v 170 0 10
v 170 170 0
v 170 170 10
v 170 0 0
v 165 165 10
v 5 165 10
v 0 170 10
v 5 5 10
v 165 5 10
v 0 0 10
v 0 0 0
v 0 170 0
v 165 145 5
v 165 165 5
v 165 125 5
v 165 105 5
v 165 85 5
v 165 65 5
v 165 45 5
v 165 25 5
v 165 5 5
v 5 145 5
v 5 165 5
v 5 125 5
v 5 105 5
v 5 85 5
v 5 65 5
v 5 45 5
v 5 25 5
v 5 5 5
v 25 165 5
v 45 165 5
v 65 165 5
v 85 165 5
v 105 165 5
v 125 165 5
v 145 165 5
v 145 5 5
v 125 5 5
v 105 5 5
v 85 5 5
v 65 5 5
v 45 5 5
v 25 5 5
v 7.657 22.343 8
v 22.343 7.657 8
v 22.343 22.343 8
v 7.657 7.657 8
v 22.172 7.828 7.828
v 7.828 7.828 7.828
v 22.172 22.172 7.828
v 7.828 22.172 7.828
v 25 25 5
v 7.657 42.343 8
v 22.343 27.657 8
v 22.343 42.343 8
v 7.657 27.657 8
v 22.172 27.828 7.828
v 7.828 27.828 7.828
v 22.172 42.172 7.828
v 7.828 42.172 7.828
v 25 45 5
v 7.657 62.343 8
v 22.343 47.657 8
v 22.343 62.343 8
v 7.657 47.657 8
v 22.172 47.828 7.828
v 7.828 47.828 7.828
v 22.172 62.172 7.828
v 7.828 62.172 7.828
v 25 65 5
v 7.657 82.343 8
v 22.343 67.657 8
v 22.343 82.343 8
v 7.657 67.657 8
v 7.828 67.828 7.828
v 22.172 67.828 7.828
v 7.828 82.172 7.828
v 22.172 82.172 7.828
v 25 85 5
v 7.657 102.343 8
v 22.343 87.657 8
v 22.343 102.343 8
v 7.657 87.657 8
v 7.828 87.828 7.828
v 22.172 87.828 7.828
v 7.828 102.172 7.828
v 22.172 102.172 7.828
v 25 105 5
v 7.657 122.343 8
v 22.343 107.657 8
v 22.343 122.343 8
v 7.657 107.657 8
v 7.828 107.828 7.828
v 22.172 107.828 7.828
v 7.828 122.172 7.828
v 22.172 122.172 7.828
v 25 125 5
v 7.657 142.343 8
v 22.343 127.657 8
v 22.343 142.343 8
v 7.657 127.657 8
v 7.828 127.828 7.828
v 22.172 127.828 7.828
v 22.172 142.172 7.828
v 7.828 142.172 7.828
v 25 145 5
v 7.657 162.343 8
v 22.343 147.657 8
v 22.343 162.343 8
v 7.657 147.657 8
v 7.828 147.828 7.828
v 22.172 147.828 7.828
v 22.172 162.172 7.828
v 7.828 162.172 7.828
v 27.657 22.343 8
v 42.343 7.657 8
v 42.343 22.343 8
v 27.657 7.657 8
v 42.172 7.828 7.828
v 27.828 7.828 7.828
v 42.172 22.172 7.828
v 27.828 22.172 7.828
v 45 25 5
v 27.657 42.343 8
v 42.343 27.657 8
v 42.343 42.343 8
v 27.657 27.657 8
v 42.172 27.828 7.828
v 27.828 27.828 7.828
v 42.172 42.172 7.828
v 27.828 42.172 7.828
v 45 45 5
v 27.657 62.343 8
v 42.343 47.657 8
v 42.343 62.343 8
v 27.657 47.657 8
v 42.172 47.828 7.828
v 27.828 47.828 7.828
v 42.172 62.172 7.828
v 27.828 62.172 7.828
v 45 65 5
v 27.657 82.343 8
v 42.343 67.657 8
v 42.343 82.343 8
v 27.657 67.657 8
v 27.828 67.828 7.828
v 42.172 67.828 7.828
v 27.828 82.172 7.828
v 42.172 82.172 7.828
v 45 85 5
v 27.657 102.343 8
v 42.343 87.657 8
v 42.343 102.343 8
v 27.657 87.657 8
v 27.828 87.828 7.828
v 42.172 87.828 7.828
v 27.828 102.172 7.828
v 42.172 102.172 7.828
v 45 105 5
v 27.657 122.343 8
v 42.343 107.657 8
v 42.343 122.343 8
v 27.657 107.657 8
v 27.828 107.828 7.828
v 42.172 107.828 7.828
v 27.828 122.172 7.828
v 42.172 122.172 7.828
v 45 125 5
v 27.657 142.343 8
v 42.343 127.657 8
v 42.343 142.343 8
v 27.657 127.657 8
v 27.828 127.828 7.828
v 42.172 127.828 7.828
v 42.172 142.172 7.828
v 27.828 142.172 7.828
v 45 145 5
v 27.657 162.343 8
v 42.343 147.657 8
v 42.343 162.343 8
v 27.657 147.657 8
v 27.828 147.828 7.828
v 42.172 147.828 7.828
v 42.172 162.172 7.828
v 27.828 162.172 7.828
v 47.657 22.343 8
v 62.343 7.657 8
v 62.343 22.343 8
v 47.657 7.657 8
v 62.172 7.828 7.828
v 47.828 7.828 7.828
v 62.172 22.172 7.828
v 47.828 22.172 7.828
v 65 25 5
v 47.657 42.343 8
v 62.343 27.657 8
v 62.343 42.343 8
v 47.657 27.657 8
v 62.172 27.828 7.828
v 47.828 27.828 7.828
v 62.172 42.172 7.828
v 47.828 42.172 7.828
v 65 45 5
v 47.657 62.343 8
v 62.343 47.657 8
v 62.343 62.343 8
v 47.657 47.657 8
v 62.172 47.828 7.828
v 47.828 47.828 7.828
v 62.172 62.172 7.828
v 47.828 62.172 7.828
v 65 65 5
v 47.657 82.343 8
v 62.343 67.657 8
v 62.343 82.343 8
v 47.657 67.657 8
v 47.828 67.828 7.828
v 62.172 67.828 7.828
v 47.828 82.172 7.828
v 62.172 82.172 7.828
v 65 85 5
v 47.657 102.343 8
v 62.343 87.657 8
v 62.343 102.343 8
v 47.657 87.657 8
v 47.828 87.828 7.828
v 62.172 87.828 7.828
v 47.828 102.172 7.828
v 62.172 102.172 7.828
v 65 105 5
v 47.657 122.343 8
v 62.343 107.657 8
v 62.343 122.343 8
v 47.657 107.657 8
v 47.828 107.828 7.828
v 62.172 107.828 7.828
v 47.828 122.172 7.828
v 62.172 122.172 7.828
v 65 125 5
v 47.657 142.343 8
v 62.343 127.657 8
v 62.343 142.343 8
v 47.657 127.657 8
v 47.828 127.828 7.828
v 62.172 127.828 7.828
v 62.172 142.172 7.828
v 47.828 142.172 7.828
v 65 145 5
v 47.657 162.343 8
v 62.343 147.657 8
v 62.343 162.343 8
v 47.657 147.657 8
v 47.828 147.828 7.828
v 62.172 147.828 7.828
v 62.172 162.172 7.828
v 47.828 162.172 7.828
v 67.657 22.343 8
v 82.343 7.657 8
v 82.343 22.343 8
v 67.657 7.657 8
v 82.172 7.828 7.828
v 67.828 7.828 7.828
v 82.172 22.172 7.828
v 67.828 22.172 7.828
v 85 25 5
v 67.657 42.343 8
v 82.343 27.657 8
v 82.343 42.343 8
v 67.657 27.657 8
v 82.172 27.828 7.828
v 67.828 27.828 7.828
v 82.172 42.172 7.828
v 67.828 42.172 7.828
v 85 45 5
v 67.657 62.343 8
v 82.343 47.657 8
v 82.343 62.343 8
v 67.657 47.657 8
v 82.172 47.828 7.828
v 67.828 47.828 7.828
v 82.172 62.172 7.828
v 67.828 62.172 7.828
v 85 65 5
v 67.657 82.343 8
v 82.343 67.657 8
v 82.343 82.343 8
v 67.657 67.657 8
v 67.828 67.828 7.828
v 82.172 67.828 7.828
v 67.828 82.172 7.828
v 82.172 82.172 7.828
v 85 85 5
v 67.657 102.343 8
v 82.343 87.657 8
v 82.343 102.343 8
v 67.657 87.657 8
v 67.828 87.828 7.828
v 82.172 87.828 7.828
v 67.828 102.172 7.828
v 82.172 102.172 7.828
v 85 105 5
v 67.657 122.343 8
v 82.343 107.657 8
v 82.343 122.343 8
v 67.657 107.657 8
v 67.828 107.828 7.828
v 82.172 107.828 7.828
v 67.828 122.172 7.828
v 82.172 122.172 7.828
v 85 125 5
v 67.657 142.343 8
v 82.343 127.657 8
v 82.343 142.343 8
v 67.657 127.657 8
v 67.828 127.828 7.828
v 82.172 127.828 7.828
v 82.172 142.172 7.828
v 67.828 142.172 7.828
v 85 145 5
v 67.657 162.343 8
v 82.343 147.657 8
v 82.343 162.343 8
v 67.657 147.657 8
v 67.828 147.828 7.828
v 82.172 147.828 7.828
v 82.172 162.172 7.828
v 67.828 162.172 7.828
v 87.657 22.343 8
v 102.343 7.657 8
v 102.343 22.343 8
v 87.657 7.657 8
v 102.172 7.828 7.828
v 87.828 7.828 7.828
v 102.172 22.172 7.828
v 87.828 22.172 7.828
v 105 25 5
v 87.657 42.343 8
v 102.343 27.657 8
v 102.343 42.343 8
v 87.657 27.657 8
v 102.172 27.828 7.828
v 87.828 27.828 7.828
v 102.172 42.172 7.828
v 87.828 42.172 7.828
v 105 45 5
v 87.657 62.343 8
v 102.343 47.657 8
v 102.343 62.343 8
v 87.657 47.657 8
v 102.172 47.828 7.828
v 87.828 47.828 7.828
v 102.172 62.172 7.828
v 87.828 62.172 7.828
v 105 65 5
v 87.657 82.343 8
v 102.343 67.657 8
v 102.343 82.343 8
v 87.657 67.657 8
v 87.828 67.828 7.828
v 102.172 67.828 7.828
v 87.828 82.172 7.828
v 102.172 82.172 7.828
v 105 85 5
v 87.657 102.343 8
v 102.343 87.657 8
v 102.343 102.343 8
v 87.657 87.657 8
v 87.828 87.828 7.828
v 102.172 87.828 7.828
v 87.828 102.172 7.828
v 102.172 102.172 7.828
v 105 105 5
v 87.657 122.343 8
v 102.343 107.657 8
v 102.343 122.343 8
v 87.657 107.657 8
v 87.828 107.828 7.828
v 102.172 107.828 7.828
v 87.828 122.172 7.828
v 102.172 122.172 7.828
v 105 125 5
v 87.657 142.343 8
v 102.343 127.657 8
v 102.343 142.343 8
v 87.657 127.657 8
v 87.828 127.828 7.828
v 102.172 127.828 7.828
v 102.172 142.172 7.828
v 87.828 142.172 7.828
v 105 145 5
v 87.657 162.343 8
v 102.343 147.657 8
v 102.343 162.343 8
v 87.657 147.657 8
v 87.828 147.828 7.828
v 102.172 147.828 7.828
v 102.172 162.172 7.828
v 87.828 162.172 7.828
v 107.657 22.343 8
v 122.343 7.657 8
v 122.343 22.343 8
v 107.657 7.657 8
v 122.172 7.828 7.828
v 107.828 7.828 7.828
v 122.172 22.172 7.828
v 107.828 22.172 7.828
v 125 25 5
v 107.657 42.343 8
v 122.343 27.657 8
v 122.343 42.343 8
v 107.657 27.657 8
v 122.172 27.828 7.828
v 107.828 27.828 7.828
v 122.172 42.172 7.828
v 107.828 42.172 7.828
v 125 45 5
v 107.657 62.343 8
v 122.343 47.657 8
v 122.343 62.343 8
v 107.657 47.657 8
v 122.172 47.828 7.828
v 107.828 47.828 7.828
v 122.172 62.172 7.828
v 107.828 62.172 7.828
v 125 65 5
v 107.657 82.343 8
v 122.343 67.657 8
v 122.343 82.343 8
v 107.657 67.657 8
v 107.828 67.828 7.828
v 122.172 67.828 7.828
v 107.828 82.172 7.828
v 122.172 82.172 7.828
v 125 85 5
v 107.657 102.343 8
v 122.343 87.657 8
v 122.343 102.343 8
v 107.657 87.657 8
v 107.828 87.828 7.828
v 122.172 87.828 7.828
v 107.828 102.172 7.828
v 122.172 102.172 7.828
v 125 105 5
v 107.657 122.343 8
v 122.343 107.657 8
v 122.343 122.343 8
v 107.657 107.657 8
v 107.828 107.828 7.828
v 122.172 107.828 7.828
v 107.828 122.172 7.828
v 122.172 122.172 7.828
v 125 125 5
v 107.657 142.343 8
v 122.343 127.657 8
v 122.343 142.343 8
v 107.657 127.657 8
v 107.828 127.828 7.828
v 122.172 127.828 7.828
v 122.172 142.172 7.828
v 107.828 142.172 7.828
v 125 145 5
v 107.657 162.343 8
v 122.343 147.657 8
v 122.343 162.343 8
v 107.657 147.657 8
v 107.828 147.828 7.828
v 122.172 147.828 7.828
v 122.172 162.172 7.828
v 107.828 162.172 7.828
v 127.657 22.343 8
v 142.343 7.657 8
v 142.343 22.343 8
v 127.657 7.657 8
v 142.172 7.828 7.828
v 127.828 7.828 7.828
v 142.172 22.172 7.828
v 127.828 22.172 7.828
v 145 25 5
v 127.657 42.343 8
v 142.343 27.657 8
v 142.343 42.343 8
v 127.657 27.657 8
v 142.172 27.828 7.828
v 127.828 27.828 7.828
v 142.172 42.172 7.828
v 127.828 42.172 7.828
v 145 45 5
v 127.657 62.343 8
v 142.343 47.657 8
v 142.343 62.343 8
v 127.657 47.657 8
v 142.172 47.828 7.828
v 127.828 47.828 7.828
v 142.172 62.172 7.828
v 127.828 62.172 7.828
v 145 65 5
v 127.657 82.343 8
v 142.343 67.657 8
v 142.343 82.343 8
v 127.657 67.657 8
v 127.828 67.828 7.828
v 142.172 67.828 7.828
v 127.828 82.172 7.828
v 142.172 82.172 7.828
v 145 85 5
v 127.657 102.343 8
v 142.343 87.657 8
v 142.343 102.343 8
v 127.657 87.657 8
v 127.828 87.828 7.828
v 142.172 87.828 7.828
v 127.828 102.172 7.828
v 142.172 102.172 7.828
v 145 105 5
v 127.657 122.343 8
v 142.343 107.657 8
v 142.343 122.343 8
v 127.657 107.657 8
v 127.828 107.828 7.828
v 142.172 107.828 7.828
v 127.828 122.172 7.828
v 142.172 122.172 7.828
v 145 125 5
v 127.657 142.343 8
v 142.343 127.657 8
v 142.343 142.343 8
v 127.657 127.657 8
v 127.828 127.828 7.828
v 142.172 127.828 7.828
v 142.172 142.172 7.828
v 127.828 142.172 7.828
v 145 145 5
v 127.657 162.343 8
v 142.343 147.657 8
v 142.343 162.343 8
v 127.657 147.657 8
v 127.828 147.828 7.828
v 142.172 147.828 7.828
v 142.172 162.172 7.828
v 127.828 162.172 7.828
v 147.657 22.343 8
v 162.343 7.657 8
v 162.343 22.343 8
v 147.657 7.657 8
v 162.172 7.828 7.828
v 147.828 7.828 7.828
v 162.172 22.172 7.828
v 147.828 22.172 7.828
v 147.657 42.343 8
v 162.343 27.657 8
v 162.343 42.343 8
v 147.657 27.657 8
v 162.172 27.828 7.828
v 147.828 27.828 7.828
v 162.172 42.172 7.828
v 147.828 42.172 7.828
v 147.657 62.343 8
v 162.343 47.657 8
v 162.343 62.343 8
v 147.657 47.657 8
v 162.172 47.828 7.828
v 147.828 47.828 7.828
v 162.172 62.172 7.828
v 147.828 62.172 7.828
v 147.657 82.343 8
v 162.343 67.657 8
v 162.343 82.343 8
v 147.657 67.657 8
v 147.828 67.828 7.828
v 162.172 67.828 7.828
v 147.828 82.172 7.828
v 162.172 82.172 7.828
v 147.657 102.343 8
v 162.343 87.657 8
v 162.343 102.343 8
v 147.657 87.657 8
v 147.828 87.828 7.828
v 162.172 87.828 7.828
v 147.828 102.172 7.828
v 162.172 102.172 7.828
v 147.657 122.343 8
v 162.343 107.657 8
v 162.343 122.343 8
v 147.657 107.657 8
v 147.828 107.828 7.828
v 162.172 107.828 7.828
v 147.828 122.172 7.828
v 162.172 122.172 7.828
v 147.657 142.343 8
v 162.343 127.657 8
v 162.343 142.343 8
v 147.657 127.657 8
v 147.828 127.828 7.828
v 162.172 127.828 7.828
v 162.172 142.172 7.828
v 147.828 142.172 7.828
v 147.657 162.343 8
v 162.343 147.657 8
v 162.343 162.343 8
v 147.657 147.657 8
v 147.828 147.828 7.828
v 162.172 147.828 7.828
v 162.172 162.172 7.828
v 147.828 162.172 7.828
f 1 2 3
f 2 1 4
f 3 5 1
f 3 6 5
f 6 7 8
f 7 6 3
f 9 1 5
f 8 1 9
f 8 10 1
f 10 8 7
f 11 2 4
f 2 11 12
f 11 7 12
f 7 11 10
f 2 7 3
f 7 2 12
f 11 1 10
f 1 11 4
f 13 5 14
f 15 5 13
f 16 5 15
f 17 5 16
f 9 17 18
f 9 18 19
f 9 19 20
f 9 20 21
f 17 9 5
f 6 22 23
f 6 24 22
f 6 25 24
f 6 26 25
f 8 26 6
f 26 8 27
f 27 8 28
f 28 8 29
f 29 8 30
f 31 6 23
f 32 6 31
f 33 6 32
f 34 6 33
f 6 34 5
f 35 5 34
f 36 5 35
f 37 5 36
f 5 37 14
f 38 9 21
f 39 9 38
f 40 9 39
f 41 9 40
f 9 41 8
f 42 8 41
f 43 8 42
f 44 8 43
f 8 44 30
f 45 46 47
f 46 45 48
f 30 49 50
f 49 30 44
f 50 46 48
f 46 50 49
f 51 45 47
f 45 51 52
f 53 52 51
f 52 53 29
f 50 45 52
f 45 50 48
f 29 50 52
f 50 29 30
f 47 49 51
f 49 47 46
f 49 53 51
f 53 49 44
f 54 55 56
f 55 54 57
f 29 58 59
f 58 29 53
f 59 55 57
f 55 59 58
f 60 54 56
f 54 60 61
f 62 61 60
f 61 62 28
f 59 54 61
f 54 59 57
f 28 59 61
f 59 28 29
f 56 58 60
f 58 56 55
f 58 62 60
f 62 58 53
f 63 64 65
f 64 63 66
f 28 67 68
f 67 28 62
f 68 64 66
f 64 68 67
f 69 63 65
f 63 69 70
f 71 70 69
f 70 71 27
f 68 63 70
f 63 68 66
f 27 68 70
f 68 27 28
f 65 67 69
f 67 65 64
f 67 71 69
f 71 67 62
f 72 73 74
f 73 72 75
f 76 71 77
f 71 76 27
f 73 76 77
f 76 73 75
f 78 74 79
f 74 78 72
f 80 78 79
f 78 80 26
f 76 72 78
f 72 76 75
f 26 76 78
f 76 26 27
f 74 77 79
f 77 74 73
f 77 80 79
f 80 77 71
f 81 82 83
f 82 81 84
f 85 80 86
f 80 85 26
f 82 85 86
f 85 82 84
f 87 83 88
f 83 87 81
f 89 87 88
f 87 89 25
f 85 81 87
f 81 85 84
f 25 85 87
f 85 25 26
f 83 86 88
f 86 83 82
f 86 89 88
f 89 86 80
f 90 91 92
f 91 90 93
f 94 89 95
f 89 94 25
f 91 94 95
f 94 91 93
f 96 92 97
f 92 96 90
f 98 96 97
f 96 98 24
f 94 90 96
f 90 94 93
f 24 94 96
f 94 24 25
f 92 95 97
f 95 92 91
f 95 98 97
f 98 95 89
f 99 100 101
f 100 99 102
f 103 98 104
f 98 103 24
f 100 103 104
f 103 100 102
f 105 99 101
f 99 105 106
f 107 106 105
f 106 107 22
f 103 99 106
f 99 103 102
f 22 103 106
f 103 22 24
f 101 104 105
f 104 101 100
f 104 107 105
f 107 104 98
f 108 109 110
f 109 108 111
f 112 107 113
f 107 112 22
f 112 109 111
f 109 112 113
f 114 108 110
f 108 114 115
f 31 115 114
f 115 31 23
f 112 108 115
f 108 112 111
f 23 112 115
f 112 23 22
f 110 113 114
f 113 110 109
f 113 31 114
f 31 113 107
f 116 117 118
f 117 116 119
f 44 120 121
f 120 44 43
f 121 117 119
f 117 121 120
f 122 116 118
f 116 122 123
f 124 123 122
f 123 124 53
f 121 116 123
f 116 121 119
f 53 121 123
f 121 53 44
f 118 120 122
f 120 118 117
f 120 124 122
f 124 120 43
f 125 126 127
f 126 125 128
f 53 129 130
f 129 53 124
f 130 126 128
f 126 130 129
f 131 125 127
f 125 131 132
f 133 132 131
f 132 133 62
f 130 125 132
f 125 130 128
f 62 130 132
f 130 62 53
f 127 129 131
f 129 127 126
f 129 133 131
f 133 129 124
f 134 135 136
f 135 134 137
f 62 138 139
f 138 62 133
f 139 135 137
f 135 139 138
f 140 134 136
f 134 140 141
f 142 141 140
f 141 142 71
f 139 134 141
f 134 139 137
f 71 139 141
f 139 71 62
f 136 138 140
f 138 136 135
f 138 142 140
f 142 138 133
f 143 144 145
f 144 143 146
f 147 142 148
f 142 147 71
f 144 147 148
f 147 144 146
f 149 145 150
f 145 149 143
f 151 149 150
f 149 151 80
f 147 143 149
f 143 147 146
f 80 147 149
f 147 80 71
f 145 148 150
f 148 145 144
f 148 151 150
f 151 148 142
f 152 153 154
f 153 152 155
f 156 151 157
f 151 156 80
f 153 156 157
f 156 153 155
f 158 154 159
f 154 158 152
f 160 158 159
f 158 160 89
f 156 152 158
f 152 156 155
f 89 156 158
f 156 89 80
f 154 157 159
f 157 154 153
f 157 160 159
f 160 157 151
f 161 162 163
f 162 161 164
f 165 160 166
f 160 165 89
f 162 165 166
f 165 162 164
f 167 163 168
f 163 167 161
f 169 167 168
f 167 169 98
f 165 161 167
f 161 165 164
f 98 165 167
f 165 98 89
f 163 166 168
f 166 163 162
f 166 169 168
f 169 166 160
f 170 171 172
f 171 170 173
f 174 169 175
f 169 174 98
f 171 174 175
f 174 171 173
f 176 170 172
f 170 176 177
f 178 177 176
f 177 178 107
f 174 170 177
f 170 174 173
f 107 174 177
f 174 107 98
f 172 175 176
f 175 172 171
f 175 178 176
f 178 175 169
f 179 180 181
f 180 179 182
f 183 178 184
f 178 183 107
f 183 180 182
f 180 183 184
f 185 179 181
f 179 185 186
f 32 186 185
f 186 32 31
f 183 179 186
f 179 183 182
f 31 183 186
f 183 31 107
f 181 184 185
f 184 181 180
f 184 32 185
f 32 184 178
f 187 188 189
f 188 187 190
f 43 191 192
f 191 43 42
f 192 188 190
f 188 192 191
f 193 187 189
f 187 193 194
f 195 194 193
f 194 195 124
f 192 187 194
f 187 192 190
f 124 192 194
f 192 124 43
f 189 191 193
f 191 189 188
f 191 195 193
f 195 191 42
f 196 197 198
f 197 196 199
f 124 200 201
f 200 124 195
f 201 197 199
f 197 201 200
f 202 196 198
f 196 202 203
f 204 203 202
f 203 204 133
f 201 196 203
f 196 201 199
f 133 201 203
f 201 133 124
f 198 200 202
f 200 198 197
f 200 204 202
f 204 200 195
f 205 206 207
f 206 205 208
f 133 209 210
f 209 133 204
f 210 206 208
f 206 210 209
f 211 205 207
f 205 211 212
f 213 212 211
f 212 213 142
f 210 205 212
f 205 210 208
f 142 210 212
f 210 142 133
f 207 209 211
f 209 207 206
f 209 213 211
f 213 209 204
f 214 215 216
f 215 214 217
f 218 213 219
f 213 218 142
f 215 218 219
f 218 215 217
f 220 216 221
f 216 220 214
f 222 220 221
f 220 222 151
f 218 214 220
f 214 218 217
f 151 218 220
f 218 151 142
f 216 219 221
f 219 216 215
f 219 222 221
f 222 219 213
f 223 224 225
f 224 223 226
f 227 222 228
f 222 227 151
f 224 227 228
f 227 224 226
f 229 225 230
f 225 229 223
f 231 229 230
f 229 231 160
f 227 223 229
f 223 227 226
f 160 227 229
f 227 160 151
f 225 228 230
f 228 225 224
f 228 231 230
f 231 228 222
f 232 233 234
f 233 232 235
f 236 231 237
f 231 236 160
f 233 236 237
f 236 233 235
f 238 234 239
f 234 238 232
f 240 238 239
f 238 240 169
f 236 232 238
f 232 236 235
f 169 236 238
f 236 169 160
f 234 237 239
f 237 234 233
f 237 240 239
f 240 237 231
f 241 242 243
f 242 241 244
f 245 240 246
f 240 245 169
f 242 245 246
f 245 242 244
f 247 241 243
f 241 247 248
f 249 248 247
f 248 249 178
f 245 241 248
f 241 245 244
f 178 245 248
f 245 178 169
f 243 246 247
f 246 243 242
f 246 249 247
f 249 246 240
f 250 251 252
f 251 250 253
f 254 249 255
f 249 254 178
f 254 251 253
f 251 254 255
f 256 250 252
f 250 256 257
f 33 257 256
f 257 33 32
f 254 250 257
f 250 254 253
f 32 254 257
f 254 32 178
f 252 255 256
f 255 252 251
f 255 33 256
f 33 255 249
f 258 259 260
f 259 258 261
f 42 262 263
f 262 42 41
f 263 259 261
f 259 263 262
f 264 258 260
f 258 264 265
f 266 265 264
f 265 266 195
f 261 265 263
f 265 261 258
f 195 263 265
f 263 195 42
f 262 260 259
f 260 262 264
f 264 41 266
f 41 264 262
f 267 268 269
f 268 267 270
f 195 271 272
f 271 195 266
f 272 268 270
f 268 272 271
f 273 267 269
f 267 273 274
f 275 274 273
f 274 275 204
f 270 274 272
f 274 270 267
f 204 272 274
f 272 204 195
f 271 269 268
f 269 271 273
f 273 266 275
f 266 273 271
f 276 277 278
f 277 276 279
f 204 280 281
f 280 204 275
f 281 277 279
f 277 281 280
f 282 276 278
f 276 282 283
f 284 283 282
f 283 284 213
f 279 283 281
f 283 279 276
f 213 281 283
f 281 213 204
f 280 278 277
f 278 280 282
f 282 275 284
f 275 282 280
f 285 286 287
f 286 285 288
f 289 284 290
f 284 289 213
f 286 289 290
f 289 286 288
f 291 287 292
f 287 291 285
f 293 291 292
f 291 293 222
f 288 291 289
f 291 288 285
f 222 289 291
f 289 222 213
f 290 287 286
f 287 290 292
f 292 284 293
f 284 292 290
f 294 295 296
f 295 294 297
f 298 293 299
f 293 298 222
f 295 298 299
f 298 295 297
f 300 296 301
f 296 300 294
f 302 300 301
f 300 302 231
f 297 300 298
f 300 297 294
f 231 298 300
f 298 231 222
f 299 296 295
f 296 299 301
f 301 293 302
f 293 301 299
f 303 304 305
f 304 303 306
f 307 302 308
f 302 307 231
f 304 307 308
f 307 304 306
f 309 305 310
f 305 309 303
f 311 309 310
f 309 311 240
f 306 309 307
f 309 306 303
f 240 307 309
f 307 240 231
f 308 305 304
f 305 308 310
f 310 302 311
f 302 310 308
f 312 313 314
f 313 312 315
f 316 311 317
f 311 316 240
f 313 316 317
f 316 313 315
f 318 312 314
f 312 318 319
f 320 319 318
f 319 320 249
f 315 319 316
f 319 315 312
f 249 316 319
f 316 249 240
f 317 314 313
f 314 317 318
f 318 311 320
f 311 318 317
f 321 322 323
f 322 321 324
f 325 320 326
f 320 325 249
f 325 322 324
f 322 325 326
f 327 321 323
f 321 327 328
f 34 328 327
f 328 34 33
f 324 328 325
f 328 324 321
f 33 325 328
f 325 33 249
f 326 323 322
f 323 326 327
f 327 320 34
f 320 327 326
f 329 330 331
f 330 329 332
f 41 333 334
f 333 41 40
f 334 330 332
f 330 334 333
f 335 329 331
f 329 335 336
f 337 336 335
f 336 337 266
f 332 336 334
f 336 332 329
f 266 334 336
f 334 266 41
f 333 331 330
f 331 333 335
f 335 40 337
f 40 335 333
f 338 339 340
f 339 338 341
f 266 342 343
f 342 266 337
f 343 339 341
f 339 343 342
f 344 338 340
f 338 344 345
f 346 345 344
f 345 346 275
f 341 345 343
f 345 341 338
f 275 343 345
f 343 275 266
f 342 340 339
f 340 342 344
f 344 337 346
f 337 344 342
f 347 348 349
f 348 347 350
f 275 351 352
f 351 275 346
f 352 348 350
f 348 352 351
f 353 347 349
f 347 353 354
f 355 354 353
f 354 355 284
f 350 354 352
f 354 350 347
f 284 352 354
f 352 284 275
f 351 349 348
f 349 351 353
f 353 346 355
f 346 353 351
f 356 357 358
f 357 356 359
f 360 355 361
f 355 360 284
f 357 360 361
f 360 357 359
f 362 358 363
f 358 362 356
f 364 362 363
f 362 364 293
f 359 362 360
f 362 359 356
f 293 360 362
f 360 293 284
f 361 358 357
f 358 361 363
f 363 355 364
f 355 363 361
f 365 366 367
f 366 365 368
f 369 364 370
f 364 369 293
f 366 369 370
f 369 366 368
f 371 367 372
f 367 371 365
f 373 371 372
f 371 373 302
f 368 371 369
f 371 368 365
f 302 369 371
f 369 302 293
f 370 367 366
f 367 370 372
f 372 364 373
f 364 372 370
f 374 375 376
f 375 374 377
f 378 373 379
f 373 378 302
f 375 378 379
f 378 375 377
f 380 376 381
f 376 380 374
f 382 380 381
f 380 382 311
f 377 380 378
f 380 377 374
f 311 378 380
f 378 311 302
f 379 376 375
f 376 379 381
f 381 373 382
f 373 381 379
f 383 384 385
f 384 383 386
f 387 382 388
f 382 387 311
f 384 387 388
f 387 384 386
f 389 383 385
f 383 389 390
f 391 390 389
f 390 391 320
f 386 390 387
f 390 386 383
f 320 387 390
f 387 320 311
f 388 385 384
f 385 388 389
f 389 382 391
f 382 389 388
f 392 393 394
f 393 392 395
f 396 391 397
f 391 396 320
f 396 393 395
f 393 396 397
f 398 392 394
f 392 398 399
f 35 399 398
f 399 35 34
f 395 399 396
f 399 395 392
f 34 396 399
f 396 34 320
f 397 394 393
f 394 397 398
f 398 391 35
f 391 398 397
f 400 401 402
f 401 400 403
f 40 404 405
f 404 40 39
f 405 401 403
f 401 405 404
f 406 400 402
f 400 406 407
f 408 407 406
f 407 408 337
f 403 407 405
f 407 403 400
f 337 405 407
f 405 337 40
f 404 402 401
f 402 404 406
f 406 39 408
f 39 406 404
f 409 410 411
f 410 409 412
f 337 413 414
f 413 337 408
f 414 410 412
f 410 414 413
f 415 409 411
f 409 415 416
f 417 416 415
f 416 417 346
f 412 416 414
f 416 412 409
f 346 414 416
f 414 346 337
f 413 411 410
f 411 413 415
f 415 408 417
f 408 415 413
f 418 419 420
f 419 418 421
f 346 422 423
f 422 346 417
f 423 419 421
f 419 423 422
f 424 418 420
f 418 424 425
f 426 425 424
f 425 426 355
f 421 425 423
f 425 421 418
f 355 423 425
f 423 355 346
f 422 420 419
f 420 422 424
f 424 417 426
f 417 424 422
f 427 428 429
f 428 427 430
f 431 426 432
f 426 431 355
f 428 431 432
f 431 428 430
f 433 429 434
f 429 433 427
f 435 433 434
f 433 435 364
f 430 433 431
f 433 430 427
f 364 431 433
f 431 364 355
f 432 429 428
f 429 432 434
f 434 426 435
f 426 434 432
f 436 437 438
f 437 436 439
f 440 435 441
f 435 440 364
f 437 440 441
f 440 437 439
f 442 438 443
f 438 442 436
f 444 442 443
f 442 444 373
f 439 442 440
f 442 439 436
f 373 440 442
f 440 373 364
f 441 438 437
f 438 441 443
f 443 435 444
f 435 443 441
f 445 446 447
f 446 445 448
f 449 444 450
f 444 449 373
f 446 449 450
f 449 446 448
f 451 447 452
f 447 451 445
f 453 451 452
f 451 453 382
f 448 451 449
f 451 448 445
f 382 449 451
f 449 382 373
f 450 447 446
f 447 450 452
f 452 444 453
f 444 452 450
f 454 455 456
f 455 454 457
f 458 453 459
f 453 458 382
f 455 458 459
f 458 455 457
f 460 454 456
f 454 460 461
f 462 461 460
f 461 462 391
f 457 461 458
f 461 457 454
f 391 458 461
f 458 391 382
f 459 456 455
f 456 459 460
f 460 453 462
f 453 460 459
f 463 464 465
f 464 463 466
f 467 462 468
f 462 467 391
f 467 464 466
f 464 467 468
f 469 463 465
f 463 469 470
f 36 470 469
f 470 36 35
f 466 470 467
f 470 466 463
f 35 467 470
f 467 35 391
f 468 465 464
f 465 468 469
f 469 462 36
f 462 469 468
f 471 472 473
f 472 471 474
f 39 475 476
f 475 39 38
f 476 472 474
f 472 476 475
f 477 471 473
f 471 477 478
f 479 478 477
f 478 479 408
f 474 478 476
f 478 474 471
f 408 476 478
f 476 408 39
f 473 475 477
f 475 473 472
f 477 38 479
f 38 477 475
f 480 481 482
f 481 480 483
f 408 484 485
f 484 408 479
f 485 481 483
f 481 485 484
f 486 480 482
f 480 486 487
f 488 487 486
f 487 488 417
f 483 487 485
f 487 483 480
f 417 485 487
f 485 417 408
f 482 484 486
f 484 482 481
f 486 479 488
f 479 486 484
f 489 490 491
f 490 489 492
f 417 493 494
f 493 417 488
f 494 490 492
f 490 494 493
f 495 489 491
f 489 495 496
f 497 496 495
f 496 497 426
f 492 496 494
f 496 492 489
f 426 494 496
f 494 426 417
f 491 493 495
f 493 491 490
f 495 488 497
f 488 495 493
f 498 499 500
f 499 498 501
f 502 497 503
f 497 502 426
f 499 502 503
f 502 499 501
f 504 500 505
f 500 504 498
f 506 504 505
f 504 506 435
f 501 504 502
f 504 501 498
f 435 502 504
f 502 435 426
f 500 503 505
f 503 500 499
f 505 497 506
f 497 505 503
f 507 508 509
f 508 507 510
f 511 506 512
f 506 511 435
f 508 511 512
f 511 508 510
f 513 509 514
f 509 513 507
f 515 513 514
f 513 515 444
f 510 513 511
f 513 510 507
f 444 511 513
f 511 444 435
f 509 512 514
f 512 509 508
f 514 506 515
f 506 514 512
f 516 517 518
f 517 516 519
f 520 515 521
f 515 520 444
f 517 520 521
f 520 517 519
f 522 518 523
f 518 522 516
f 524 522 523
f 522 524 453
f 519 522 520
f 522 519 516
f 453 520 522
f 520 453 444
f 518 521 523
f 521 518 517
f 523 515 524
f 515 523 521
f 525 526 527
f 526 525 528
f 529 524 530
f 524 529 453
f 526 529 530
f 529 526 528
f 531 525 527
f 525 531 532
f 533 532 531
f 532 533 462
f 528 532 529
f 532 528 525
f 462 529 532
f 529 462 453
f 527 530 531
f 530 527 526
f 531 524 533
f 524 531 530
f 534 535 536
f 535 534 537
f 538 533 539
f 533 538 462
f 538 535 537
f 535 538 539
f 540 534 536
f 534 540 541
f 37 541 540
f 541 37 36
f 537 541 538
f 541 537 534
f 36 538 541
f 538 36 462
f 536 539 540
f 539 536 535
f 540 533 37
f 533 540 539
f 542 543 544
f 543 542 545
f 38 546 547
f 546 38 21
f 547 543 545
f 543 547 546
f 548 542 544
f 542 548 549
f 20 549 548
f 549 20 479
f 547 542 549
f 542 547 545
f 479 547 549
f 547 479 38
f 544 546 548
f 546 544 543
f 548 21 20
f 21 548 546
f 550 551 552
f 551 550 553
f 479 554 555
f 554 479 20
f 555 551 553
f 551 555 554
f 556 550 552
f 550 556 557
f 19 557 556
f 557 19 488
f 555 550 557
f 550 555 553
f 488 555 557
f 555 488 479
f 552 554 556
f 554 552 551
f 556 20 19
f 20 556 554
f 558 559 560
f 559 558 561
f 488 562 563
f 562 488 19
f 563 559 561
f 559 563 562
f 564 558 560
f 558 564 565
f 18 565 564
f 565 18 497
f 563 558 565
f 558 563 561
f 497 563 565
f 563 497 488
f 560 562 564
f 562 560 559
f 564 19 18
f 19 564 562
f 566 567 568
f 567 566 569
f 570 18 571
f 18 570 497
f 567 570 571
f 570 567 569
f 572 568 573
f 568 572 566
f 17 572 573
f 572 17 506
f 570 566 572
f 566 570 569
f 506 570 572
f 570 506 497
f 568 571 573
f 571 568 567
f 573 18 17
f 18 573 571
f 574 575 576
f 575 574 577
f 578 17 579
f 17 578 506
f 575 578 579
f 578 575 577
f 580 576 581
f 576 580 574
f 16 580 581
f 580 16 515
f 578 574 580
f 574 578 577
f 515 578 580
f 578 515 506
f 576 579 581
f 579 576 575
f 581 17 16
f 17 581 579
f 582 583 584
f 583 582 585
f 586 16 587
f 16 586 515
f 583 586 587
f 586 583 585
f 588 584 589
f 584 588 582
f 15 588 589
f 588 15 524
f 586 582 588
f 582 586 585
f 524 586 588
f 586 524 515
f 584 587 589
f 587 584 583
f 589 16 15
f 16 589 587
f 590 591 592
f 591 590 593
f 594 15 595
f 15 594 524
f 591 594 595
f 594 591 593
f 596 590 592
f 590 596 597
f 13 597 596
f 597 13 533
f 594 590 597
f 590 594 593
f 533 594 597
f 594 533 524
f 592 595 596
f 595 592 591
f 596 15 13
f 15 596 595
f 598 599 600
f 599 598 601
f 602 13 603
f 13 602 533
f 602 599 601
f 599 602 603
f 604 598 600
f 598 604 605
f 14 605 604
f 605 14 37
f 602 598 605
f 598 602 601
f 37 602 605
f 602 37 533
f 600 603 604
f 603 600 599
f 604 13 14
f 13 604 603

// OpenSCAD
// file: ../OpenSCAD/HourOfCode.scad
tileHeight = 5;

module tile(x, y) {

    difference() {
        difference() {
            difference(){
                difference() {
                    translate([x, y, 0])
                        cube([20,20,tileHeight]);

                translate([x , y , tileHeight-3])
                    rotate([45,0,0])
                        cube([20, 4, 4]);
                } 
            translate([x , y + 20, tileHeight-3])
                rotate([45,0,0])
                    cube([20, 4, 4]);
            }

        translate([x , y , tileHeight-3])
            rotate([45,0,90])
               cube([20, 4, 4]);
        }
        translate([x + 20, y + 0, tileHeight-3])
            rotate([45,0,90])
               cube([20, 4, 4]);
    }

}



module cog(x, y) {
    translate([x, y, 0]) {
        cube([20, 20, 1]);
        translate([10, 10, 1]) {
            scale([0.25, 0.25, 0.25]) {
                surface(file = "../OpenSCAD/HourOfCodeCog.png", center = true, convexity = 5);
            }
        }
    }
}

module cross(x, y) {
    translate([x, y, 0]) {
        cube([20, 20, 1]);
            translate([10, 10, 15]) {
            rotate([0, 0, 0]) {
                scale([0.18, 0.18, 0.15]) {
                    surface(file = "../OpenSCAD/HourOfCodeCross.png", invert = true, center = true, convexity = 5);
                }
            }
        }
    }
}

module boxes(x, y) {
    translate([x, y, 0]) {
        cube([20, 20, 1]);
        translate([6, 1, 0])
            rotate([0, 0, 45])
                cube([7, 7, 7]);
        translate([8, 11, 0])
            rotate([0, 0, 10])
                cube([7, 7, 7]);
        translate([14, 3, 0])
            rotate([0, 0, 40])
                cube([7, 7, 7]);
        translate([8, 6, 7])
            rotate([0, 0, 0])
                cube([7, 7, 7]);
    }
}

module boardTest() {
    difference() {
        cube([50, 50, 10]);
        translate([5, 5, 5])
            cube([40, 40, 6]);
    }
    translate([5, 5, 3])
        for (tx =[0:20:30]) 
            for (ty =[0:20:30]) {
                tile(tx,ty);
            }
}

module board() {
    difference() {
        cube([170, 170, 10]);
        translate([5, 5, 5])
            cube([160, 160, 6]);
    }
    translate([5, 5, 3])
        for (tx =[0:20:150]) 
            for (ty =[0:20:150]) {
                tile(tx,ty);
            }
}

module topPiece(x, y) {
    translate([x + 20, y, 8]) {
    rotate([0, 180, 0]) {
        difference() {
            translate([0, 0, 2]) 
                cube([20, 20, 6]);
            tile(0, 0);
        }
    }
}
}

/*
for (tx =[0:22:60]) {
    topPiece(tx, 0);
}
*/



/*
translate([0, 0, 0])
    color("Blue", 0.5)
        cog(0, 0);
//translate([0, 20, 0])
//    rotate([180, 0, 0])
//        topPiece(0, 0);


translate([0, -25, 0])
    color("Red", 0.5)
        cross(0, 0);
//translate([0, -5, 0])
//    rotate([180, 0, 0])
//        topPiece(0, 0);
*/


//tile(0, 0);
//board();
//boardTest();
//topPiece(0,0);
//cog(0, 0);
//cross(0, 0);



  
// main file
include <../OpenSCAD/HourOfCode.scad>;

/*
// ------------------------------------------------------------- //
// ------------------------------------------------------------- //
//                        T O    U S E  ;                        //
// 1. Create a file and add the following line at the top;       //
include <../OpenSCAD/HourOfCode.scad>; // already done in this file
// 2. Use one of the following templates;                        
//tile(x, y);   // build a tile, which a top piece can fit on
//board();      // build an 8 x 8 board of tiles
//boardTest();  // build a 2 x 2 board of tiles
//topPiece(x,0);// build a top piece, which will fit on top of the board
//cog(x, y);    // build a cog, to fit on top of a top piece (scrap metal)
//cross(x, y);  // build a cross, to fit on top of a top piece (bandit)
//boxes(x, y)   // build a pile of boxes, to fit on top of a top piece (obstacle)
// where x and y are the coordinates used to place the model (0, 0 works well)
*/
// ------------------------------------------------------------- //
// ------------------------------------------------------------- //

board();
